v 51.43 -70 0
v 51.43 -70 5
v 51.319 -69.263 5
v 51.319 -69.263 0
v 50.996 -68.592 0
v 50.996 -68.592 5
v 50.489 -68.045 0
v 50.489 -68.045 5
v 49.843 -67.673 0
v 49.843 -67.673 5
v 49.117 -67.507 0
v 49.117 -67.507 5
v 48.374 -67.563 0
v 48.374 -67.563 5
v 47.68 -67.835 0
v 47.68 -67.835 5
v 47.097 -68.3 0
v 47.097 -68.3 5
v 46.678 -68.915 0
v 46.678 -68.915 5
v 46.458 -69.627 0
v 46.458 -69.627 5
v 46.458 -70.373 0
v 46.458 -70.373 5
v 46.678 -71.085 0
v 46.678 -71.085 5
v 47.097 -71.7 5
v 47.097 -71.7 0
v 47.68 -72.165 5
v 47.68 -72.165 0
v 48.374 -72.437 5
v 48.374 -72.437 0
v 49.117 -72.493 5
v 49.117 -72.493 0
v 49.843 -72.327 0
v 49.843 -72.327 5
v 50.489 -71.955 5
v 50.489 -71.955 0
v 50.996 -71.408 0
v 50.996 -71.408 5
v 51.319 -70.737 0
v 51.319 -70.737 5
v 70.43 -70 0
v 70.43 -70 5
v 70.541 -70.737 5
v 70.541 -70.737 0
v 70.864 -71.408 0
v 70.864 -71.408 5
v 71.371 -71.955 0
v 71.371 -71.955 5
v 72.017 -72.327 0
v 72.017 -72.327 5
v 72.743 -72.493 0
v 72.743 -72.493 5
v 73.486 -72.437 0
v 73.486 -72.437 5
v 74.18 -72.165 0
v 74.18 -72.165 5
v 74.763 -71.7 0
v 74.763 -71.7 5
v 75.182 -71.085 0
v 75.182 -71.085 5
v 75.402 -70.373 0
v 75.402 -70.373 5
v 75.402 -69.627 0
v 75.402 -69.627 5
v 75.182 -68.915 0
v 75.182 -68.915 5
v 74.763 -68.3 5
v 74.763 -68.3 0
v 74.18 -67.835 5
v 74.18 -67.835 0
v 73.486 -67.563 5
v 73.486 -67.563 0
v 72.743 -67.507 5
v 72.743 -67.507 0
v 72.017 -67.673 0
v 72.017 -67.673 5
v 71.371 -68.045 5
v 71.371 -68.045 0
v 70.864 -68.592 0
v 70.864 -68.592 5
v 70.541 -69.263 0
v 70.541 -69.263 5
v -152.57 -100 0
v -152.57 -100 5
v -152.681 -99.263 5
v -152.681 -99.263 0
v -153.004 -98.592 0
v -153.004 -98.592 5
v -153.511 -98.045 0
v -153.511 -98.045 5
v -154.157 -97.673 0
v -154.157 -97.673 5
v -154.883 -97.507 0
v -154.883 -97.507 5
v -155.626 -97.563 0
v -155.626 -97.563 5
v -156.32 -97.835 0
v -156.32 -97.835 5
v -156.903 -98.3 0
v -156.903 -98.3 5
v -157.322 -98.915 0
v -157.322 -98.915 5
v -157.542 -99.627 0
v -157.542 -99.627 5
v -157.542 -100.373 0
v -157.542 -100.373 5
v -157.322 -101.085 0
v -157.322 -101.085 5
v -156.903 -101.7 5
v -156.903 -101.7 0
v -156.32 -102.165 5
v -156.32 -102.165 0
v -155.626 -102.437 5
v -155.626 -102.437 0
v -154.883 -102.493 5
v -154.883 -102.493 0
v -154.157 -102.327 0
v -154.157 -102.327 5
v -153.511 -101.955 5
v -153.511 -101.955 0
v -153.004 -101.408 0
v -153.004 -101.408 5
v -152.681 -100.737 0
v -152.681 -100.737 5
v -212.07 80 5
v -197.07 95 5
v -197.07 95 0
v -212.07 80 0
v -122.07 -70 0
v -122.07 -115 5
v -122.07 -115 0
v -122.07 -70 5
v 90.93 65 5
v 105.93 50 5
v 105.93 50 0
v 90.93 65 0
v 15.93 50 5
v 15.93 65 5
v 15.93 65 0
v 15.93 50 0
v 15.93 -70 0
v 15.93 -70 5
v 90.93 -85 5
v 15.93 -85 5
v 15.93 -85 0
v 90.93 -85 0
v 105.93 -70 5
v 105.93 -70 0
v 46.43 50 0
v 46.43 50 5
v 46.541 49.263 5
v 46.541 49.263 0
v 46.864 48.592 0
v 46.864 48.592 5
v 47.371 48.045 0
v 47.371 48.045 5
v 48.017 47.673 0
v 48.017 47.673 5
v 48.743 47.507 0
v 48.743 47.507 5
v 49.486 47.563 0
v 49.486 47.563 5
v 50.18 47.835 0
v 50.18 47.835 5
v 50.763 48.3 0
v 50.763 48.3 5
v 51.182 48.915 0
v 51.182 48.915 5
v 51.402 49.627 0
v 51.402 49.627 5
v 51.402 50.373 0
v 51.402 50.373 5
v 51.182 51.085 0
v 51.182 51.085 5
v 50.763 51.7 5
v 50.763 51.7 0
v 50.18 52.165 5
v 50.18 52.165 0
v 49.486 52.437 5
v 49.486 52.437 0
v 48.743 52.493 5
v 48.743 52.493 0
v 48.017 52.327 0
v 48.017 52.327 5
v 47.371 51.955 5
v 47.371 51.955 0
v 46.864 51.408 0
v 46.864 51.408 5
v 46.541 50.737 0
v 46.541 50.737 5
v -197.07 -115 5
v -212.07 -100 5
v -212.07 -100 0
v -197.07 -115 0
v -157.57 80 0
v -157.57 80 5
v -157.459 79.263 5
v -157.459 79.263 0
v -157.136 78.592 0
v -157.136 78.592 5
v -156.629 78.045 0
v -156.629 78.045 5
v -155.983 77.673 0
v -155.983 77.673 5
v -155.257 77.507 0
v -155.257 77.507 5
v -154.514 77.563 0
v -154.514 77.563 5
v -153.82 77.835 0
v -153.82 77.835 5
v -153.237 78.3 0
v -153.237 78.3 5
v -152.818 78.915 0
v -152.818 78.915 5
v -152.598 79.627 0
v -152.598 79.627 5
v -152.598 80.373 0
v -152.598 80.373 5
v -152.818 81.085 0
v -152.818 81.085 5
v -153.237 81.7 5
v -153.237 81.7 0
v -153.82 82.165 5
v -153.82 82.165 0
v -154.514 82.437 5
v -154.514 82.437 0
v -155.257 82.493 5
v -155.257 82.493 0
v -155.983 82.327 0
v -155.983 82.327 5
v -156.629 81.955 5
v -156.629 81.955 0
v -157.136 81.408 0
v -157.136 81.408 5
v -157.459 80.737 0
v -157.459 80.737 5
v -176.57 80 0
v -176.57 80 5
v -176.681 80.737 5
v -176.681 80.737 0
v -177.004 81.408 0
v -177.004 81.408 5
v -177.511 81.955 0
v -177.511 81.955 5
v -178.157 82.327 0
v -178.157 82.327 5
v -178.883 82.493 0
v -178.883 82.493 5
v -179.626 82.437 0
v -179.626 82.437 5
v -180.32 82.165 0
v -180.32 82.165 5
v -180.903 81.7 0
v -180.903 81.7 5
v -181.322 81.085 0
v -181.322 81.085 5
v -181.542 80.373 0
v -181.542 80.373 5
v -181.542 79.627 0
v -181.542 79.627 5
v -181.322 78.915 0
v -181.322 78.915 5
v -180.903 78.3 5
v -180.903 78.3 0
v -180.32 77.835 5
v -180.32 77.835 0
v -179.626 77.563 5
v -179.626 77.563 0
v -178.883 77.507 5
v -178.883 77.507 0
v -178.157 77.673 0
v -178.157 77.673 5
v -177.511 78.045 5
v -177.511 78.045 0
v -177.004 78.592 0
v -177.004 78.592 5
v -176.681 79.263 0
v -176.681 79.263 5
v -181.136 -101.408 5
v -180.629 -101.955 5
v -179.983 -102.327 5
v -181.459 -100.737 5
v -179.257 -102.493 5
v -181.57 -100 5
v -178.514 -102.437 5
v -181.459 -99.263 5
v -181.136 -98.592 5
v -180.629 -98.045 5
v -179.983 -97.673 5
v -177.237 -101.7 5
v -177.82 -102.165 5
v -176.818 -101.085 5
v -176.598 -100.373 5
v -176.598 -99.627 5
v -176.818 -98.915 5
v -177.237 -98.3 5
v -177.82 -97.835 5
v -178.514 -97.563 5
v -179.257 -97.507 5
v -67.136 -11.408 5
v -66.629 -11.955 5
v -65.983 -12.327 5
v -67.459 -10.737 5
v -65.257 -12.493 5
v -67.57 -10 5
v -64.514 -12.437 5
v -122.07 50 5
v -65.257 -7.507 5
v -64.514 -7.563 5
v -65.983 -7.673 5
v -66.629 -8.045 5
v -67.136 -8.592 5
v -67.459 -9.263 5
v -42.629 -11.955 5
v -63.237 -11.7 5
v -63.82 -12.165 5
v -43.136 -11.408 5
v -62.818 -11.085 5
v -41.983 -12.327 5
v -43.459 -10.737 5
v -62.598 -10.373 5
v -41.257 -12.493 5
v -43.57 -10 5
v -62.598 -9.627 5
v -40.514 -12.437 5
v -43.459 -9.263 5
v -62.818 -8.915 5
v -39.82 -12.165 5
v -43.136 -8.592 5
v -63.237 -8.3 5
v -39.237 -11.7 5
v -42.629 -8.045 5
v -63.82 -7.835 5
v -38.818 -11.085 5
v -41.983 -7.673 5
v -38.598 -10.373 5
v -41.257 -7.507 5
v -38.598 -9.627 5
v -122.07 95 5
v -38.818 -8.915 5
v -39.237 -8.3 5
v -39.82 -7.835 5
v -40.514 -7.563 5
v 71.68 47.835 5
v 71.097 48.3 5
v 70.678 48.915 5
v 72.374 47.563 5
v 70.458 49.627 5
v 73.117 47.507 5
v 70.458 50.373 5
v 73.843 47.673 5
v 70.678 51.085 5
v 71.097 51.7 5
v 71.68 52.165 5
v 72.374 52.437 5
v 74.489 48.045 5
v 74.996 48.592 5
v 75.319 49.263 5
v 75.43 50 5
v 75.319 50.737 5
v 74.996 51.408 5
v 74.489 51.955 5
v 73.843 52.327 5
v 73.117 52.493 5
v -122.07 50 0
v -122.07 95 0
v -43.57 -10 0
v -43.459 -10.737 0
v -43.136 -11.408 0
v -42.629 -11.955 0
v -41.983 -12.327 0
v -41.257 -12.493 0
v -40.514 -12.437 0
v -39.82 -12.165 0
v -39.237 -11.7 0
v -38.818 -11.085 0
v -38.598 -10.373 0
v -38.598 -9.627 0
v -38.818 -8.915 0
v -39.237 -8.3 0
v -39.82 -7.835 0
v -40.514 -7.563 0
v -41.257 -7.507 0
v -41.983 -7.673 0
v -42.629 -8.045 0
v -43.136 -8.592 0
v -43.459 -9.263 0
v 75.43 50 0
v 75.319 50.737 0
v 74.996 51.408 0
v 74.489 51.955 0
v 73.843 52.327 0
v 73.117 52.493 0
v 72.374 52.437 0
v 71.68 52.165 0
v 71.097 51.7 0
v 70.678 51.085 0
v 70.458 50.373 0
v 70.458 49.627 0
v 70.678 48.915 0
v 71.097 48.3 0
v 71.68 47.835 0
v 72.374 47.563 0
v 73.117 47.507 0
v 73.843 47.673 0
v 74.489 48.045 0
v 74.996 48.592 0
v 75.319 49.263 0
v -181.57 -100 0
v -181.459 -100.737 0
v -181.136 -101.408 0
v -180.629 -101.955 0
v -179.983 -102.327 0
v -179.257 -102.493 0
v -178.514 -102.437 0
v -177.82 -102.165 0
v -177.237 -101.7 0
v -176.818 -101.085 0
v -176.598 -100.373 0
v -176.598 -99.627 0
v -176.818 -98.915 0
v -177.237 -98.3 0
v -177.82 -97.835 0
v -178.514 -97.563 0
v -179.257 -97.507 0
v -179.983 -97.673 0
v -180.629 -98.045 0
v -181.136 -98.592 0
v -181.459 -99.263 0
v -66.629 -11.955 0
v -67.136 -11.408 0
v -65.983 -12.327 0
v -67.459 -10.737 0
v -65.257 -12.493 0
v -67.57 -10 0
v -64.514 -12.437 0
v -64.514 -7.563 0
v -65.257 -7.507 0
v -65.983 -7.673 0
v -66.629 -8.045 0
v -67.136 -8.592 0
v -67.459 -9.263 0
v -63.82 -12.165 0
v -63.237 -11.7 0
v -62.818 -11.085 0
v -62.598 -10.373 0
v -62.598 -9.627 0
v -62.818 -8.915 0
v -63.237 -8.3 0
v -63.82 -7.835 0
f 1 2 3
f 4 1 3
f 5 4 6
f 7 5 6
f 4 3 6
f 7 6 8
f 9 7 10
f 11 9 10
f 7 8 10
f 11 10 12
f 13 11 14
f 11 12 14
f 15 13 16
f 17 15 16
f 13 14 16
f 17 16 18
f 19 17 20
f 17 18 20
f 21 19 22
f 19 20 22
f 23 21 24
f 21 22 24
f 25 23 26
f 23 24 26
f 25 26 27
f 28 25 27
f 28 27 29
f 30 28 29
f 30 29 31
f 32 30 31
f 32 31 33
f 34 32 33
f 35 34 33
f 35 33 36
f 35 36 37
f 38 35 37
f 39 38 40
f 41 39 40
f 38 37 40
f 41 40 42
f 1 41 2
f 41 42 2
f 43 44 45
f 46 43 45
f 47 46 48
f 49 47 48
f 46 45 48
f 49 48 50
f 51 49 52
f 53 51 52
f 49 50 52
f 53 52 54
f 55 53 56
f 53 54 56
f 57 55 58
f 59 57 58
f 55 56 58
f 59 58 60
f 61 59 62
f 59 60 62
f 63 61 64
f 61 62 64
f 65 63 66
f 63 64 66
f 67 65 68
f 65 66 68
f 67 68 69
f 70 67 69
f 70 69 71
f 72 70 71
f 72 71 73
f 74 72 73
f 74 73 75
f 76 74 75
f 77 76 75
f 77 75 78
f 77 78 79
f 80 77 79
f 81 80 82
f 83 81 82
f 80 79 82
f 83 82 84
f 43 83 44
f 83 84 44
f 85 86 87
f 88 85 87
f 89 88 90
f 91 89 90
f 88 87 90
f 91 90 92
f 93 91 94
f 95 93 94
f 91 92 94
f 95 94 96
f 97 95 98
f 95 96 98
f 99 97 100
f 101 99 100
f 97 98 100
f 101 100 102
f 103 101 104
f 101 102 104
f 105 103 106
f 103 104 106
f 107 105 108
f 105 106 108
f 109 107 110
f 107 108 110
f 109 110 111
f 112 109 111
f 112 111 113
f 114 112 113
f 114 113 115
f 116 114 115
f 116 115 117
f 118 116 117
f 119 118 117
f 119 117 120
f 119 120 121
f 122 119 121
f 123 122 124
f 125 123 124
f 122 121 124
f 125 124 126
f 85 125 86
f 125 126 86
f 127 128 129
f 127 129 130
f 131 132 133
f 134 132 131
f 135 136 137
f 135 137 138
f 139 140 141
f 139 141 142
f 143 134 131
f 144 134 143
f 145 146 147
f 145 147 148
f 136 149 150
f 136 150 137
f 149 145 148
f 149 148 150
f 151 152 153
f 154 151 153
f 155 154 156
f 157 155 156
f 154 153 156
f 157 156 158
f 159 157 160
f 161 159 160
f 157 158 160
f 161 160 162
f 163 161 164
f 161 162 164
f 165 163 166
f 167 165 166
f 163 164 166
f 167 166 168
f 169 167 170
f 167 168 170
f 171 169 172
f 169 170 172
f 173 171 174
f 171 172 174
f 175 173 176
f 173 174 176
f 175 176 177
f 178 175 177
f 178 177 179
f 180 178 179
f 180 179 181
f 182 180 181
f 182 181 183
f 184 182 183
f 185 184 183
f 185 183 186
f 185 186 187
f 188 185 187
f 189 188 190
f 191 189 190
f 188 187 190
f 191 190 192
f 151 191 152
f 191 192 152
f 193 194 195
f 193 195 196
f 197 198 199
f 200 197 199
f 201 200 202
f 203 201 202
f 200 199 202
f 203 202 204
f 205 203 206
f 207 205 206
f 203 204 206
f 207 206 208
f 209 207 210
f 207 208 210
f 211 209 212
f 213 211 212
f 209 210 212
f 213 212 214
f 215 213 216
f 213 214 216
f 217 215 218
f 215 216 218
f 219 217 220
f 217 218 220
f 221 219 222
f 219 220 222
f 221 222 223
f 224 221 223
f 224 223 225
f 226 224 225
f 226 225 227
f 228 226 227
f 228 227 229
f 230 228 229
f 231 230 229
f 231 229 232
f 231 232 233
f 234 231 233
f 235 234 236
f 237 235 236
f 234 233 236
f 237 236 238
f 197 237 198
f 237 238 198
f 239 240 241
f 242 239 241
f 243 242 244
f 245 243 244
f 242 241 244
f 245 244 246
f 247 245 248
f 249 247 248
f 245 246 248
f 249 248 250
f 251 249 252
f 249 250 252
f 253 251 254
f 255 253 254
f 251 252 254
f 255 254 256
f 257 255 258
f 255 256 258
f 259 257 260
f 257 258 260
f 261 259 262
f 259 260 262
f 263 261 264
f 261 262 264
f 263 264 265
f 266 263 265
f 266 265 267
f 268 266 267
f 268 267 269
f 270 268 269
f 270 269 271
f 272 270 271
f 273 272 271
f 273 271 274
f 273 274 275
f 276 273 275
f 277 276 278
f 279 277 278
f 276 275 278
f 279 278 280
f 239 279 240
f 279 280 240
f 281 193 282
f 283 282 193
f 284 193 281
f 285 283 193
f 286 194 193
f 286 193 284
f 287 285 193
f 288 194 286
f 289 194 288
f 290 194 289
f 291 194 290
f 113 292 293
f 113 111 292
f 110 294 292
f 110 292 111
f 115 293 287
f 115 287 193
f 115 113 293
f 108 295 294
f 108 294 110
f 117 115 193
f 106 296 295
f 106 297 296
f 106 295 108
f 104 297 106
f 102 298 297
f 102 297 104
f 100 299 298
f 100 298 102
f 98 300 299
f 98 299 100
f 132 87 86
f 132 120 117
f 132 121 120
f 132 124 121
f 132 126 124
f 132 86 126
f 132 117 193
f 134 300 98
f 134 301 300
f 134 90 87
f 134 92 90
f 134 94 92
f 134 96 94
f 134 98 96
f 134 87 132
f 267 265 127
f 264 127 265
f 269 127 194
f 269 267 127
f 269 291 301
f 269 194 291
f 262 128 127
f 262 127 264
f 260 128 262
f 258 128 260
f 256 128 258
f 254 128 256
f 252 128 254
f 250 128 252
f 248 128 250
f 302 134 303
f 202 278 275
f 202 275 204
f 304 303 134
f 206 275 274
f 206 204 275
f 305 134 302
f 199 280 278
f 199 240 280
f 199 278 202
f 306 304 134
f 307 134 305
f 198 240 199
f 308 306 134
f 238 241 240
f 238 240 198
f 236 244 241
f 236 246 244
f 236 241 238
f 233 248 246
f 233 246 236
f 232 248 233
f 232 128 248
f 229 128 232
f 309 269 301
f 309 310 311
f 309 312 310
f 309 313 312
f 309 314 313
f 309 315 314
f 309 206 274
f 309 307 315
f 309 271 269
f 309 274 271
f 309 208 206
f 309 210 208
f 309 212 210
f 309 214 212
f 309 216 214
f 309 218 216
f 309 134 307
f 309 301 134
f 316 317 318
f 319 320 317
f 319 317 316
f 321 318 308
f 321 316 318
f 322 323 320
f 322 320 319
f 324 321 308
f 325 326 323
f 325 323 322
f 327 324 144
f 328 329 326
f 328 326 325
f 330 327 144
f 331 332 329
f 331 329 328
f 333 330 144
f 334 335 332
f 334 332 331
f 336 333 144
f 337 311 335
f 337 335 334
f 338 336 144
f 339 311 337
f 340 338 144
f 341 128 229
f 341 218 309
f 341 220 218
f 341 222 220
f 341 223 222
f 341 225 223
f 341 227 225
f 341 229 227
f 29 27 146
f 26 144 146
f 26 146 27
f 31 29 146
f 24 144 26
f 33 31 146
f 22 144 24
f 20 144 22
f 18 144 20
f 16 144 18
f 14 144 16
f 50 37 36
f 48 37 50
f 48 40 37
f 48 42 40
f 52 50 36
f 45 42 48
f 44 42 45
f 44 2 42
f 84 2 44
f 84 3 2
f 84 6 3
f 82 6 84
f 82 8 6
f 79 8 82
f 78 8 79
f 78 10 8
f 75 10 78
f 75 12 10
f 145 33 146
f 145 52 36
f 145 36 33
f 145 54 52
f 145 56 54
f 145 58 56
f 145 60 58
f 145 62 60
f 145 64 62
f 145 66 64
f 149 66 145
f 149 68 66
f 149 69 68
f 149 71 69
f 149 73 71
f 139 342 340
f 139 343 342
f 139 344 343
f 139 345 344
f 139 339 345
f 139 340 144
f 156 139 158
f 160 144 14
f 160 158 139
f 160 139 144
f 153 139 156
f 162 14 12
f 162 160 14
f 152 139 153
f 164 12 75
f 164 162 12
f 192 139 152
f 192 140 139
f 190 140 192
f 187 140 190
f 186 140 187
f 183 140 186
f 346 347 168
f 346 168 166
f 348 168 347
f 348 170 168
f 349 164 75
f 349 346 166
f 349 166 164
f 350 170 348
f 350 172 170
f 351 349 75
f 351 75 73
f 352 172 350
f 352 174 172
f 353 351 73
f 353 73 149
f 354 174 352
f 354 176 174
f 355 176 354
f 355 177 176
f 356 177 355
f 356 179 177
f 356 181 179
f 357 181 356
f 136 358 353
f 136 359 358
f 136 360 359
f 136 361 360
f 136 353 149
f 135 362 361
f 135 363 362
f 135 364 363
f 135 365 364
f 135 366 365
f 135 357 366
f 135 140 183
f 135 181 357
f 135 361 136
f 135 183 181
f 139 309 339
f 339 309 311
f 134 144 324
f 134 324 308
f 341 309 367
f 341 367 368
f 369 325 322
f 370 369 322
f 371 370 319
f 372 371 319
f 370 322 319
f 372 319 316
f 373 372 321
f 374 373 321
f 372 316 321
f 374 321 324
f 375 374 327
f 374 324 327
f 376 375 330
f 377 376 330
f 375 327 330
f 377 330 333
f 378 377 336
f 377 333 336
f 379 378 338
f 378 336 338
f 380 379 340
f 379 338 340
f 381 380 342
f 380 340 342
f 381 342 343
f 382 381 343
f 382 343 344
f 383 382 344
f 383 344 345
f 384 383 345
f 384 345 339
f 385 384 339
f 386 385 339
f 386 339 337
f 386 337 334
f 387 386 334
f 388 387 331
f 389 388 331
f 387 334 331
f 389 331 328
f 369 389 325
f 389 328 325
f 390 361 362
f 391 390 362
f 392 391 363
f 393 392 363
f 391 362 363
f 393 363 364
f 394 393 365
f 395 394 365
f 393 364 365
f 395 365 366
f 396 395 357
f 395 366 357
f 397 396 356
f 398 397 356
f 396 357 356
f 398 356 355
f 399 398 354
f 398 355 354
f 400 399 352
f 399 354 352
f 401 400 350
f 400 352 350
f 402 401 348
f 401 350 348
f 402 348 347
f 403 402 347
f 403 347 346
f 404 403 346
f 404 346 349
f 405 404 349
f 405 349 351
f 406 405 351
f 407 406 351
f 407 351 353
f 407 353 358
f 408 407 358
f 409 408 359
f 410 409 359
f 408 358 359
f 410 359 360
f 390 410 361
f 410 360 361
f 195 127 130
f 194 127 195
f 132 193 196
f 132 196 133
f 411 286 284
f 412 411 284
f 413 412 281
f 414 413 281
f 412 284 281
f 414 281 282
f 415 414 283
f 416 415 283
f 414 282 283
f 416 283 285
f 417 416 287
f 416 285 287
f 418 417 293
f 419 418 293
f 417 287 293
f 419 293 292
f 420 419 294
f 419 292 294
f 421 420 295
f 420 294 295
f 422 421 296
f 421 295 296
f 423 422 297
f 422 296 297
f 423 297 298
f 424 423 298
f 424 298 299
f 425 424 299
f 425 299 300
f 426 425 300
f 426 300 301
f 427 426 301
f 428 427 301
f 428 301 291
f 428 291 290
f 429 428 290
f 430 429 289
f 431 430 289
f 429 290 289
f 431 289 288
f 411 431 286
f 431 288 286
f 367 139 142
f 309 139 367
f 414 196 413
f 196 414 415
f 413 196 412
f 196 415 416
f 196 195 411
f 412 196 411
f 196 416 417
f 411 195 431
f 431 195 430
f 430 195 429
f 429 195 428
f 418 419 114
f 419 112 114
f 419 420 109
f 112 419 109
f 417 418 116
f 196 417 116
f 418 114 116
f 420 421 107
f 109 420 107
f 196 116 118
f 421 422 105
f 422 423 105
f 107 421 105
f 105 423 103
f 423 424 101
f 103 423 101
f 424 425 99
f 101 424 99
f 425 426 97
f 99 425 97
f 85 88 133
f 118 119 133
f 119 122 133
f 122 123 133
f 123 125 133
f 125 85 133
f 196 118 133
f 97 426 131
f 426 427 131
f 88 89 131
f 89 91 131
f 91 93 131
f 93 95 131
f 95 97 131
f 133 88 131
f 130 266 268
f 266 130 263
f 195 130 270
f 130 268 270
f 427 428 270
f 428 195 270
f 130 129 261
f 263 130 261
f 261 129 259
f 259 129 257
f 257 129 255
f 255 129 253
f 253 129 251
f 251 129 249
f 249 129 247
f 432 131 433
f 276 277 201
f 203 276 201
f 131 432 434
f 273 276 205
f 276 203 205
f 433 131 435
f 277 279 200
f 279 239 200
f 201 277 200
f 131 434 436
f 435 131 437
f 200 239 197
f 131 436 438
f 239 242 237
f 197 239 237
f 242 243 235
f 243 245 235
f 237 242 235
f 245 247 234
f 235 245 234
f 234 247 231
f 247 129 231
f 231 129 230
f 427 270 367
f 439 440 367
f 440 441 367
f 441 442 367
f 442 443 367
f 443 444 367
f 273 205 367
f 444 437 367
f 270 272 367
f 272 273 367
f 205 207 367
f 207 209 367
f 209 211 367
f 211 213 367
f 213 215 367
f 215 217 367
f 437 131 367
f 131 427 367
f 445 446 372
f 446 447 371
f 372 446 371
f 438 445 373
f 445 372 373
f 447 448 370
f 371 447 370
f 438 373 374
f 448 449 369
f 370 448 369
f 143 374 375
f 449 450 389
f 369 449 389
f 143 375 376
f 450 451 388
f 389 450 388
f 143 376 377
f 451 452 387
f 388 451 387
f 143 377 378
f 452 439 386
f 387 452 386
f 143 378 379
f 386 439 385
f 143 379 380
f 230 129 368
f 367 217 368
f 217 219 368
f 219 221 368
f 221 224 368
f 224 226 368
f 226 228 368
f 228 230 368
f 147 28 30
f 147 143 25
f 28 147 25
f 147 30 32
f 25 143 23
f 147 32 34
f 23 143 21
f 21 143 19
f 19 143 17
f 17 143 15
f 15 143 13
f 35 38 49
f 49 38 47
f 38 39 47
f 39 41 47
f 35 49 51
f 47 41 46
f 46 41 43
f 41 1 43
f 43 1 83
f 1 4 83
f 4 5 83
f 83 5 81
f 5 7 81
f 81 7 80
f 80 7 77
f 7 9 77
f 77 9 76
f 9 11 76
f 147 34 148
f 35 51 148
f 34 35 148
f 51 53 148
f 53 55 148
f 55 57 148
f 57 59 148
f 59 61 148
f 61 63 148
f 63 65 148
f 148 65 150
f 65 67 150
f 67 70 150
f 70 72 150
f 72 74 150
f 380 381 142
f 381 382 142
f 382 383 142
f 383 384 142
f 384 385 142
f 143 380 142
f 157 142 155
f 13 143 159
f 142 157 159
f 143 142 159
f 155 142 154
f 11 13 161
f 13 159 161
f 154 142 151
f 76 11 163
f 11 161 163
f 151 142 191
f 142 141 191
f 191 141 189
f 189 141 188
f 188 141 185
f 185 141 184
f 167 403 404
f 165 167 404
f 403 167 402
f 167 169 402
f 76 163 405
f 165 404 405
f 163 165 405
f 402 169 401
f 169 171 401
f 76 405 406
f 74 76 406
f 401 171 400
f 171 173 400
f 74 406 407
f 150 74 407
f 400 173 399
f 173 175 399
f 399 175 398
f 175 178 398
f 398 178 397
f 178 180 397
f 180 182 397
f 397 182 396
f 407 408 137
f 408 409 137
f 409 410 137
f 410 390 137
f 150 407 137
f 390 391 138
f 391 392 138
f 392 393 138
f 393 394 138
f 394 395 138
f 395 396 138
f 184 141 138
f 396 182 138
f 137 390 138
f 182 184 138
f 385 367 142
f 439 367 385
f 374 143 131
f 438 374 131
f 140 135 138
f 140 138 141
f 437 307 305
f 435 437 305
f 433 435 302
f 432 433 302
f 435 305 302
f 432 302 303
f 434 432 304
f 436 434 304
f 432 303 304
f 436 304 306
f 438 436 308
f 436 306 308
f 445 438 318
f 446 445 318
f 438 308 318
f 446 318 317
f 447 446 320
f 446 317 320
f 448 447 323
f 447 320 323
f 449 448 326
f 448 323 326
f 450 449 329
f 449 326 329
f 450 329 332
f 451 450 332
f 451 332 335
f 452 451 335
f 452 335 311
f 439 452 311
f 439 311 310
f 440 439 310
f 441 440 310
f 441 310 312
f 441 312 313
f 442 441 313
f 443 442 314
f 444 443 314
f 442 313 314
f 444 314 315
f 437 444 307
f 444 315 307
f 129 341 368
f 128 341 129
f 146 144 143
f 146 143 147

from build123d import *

# Parameters (mm, degrees)
SKETCH_1_R      = 2.5
EXTRUDE_1_DEPTH = 5


with BuildPart() as part:
    # 草图1 → 凸台-拉伸1 (new body)
    with BuildSketch(Plane.XY.offset(5)):
        Polygon((15.930030419, -70.000000012), (15.930030419, -84.99999999), (90.930030476, -84.99999999), (105.930030424, -70.000000041), (105.930030424, 50.000000019), (90.930030476, 64.999999967), (15.930030419, 64.999999967), (15.930030419, 50.000000018), (-122.069969569, 50.000000018), (-122.069969569, 94.999999997), (-197.069969626, 94.999999997), (-212.069969578, 80.000000045), (-212.069969578, -100.000000045), (-197.069969626, -114.999999997), (-122.069969569, -114.999999997), (-122.069969569, -70.000000012), align=None)
        with Locations((-179.069969574, 80)):
            Circle(SKETCH_1_R, mode=Mode.SUBTRACT)
        with Locations(Location((-179.069969574, -100, 0), (0, 0, 180))):
            Circle(SKETCH_1_R, mode=Mode.SUBTRACT)
        with Locations(Location((72.930030422, -70.000000022, 0), (0, 0, 180))):
            Circle(SKETCH_1_R, mode=Mode.SUBTRACT)
        with Locations(Location((48.930030422, 50, 0), (0, 0, 180))):
            Circle(SKETCH_1_R, mode=Mode.SUBTRACT)
        with Locations(Location((-155.069969574, 80, 0), (0, 0, 180))):
            Circle(SKETCH_1_R, mode=Mode.SUBTRACT)
        with Locations((-155.069969574, -100)):
            Circle(SKETCH_1_R, mode=Mode.SUBTRACT)
        with Locations(Location((-65.069969575, -10, 0), (0, 0, 180))):
            Circle(SKETCH_1_R, mode=Mode.SUBTRACT)
        with Locations(Location((-41.069969575, -10.000000011, 0), (0, 0, 180))):
            Circle(SKETCH_1_R, mode=Mode.SUBTRACT)
        with Locations((72.930030422, 50)):
            Circle(SKETCH_1_R, mode=Mode.SUBTRACT)
        with Locations((48.930030422, -70.000000022)):
            Circle(SKETCH_1_R, mode=Mode.SUBTRACT)
    extrude(amount=-EXTRUDE_1_DEPTH)


solid = part.part
